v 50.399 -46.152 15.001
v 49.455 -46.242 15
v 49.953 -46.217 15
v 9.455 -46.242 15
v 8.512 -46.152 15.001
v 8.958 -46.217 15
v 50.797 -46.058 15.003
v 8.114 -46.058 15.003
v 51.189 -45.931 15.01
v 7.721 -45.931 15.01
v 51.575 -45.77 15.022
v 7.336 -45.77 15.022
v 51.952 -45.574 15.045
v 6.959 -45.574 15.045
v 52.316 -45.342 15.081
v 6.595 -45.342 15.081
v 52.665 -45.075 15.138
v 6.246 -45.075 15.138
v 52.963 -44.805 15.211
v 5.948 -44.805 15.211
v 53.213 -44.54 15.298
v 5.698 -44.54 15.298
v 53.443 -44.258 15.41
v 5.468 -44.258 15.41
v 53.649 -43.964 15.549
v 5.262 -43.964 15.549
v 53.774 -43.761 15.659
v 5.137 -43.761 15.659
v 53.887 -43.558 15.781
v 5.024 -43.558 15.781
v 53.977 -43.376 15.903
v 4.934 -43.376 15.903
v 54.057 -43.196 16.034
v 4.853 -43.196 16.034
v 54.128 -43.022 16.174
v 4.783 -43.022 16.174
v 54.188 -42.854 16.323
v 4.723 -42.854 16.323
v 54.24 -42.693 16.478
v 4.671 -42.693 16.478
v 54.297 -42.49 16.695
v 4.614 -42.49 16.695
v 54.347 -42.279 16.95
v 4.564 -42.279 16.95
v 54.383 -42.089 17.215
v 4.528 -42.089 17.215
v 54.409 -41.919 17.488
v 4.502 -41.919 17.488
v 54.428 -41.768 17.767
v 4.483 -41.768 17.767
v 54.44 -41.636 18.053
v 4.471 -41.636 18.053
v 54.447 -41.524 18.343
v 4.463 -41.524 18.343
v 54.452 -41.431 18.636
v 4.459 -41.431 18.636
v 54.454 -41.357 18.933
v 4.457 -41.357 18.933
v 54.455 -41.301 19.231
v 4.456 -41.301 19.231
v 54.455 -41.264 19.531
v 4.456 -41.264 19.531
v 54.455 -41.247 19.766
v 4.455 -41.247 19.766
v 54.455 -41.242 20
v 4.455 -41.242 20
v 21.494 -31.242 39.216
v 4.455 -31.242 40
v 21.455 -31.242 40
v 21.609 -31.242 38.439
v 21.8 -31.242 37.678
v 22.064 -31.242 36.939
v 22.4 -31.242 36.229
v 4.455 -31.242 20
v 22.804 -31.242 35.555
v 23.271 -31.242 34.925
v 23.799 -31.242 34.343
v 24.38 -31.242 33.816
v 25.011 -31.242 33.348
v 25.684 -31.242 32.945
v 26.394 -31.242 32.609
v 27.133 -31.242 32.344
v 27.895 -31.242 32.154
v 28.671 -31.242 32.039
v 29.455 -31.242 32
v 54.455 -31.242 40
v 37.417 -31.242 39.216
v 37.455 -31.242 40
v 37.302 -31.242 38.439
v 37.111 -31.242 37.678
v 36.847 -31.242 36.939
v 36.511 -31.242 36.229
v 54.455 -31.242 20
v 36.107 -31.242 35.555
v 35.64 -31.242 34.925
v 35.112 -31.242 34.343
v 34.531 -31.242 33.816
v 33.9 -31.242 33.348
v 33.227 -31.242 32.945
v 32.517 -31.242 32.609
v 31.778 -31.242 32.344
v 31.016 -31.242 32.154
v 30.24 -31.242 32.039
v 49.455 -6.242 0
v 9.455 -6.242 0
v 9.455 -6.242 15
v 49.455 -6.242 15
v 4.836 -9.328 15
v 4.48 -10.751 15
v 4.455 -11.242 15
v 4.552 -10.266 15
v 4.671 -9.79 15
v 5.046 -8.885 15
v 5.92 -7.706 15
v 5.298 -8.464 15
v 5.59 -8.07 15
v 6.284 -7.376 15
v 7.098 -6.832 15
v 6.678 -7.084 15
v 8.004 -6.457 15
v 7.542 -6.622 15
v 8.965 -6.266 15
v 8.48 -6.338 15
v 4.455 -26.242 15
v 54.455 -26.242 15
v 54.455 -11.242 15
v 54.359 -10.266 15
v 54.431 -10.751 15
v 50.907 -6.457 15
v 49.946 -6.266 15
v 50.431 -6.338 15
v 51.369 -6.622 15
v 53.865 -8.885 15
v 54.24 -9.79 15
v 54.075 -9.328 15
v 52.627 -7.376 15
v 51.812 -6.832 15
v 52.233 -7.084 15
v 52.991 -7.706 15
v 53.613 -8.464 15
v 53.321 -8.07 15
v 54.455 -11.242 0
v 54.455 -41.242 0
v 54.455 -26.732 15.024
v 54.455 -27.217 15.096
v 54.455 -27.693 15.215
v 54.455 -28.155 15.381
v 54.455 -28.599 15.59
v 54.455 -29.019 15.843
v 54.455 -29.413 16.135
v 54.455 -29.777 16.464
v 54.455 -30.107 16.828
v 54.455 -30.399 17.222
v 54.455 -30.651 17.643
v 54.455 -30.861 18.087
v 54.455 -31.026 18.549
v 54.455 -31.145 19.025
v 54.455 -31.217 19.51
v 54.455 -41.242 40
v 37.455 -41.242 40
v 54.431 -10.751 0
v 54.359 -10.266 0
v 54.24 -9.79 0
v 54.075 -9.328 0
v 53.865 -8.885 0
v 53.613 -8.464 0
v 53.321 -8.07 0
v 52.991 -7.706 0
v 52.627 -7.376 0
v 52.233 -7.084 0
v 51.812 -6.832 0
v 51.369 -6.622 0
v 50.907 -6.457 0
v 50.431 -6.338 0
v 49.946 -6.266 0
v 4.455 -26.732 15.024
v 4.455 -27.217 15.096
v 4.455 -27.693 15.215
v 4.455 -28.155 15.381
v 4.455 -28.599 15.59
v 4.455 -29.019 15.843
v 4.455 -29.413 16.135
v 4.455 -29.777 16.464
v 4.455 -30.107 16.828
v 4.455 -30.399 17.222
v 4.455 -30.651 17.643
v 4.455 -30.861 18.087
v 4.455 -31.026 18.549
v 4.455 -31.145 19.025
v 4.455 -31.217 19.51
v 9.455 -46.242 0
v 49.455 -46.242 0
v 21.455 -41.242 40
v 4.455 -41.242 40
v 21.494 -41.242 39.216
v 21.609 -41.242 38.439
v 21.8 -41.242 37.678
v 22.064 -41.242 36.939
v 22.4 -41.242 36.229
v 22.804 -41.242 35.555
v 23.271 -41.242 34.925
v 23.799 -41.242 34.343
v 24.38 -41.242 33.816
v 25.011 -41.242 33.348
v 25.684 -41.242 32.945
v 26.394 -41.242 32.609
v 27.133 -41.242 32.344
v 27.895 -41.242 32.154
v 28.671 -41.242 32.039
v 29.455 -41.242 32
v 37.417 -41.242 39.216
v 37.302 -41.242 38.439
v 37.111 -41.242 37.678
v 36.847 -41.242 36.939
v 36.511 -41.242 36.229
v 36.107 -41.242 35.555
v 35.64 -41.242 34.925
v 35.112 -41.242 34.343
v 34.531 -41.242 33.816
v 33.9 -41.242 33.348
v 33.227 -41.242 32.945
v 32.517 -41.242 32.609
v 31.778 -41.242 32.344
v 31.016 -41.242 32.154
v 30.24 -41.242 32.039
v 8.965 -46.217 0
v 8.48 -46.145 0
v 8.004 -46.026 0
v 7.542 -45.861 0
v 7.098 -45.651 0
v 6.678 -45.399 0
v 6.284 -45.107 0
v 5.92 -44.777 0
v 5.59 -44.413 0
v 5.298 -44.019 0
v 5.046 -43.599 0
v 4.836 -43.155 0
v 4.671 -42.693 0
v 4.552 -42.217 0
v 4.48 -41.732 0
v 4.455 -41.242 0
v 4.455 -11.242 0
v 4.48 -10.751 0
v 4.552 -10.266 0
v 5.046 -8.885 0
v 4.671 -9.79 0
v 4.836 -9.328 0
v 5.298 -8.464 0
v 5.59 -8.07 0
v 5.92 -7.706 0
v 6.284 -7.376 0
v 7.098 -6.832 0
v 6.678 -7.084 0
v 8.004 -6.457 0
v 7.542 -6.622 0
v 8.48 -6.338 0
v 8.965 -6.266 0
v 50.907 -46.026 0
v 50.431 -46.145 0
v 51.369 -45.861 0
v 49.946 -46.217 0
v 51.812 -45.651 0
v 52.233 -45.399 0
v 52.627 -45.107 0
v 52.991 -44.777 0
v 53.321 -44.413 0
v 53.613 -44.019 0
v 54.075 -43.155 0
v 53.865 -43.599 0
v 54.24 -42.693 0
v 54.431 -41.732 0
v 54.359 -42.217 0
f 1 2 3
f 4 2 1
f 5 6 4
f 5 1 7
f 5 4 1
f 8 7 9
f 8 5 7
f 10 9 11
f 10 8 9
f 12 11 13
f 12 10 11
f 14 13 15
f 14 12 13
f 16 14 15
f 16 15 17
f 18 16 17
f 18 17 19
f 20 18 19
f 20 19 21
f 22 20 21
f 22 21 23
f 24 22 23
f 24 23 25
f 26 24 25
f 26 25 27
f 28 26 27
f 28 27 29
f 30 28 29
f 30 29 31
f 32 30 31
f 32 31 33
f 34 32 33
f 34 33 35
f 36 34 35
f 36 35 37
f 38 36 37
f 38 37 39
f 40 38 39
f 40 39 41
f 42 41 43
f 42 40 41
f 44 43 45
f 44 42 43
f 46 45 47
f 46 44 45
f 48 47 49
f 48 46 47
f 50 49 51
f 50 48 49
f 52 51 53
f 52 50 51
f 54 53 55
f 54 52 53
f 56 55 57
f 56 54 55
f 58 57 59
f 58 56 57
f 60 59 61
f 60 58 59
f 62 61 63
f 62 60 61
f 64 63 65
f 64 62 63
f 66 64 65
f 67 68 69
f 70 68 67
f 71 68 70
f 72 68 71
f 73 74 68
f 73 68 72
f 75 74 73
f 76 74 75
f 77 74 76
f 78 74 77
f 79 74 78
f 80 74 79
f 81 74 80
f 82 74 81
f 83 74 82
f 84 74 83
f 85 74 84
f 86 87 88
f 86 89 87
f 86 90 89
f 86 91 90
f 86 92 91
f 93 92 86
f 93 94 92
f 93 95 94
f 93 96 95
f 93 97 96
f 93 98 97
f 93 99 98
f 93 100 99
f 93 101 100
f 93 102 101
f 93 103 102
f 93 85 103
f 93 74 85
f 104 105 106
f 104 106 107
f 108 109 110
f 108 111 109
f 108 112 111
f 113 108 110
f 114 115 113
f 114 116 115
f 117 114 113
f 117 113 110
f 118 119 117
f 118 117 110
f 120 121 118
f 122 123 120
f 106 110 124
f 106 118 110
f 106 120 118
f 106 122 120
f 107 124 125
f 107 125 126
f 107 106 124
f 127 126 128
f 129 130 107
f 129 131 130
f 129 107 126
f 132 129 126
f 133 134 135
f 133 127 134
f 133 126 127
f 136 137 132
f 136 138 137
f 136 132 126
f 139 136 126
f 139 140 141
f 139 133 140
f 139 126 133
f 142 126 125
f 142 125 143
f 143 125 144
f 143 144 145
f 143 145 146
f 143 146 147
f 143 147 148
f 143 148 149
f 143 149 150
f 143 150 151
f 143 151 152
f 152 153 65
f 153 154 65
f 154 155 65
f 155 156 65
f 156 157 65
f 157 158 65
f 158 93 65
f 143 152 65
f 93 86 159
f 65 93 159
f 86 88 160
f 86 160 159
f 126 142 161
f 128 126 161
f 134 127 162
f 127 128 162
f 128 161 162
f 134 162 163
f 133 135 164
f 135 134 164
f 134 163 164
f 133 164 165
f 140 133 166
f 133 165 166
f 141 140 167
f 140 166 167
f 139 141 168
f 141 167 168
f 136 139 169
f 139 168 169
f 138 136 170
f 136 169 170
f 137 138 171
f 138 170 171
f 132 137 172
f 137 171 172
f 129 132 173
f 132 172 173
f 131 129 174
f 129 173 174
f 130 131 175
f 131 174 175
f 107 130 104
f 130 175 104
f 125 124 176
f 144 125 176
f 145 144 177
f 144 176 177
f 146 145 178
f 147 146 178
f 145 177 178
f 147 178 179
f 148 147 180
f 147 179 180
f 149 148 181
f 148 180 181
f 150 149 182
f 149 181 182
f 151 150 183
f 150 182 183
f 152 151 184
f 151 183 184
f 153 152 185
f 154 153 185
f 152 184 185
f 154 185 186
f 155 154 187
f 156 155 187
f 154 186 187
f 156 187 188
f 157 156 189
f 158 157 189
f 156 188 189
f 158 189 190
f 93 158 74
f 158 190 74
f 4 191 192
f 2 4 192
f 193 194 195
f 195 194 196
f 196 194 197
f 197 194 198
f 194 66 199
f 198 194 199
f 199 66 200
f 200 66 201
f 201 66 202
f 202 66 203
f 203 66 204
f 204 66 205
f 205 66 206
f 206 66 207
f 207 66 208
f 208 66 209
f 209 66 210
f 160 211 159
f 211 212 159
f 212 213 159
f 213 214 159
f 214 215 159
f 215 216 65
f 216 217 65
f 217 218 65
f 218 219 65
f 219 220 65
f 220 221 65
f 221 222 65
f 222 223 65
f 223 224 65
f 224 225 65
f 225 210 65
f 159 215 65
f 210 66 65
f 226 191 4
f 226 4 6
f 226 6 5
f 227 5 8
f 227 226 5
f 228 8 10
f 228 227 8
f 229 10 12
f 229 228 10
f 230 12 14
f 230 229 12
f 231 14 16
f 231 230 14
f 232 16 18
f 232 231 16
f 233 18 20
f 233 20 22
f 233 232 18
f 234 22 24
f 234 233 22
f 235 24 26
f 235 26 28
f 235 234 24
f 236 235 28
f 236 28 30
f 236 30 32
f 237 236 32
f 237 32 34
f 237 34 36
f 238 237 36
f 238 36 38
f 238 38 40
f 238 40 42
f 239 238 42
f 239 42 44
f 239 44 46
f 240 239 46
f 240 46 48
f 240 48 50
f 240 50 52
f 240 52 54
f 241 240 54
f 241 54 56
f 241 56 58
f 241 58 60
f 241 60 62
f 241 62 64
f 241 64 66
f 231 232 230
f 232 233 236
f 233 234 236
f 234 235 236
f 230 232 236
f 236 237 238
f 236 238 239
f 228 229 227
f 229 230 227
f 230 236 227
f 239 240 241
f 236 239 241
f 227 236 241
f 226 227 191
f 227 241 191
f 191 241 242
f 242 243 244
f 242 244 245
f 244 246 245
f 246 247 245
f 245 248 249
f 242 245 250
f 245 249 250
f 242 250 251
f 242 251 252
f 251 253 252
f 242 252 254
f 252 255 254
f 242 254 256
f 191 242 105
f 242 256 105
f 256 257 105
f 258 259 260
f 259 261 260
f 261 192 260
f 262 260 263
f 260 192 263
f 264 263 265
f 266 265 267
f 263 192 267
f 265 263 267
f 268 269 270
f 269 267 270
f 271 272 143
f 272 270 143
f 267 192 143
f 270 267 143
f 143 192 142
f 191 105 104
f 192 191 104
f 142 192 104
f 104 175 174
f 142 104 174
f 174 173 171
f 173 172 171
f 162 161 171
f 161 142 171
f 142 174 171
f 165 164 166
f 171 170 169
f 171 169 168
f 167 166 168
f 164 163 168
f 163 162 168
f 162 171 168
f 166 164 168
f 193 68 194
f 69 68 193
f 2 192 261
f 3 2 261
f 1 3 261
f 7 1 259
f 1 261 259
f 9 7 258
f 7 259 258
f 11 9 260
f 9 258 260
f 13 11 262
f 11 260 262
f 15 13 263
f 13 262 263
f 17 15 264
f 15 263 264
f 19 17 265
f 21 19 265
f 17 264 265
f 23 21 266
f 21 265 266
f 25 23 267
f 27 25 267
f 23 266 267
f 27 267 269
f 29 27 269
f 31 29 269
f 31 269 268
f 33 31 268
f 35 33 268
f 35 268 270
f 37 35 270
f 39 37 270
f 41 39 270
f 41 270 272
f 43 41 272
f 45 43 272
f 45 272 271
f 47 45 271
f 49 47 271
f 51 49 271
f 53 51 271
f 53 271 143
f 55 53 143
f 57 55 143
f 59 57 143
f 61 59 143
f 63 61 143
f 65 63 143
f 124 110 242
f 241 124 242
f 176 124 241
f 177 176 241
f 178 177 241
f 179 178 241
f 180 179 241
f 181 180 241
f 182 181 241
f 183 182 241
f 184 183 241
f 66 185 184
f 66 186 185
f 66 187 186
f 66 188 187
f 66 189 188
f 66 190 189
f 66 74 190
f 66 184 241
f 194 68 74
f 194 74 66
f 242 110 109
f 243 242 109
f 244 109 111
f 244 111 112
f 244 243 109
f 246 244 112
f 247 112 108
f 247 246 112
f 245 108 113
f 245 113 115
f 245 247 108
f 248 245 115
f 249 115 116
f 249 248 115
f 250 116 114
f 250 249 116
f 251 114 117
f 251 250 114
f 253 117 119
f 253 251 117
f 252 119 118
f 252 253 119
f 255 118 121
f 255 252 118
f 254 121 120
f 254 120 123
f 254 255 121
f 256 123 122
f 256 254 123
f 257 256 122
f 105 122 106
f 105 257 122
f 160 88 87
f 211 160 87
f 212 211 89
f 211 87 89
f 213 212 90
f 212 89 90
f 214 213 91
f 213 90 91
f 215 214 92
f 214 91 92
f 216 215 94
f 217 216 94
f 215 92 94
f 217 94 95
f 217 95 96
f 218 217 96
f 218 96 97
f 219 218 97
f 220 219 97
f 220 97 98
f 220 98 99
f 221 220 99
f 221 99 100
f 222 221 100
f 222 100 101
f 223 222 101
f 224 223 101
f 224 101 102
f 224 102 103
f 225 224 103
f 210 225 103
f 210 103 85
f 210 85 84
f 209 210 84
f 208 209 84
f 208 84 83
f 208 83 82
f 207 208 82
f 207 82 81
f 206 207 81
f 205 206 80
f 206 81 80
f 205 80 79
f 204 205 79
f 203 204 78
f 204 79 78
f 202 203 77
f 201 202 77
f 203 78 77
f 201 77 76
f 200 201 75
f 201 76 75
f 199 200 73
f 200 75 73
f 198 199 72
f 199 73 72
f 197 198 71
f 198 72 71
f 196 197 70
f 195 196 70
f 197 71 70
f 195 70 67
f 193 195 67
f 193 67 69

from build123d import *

# Parameters (mm, degrees)
F0_W        = 50
F0_H        = 40
F1_DEPTH    = 15
F2_W        = 50
F2_H        = 10
F3_DEPTH    = 25
F5_DEPTH    = 25
F7_T1_DEPTH = 50
F7_T3_DEPTH = 40


# Not quite as in the source:
# - a fillet or chamfer that OpenCascade refuses, or shapes differently, is made with other operations: its cross-section is extruded or revolved along the edge and cut away or added
# - a feature of the source that left no trace in its solid (it failed there, or was rolled back) is left out


with BuildPart() as f1:
    # F0 (on Top) → F1 (new body)
    with BuildSketch(Plane.XY):
        with Locations((29.4554777443, -26.2415218353)):
            Rectangle(F0_W, F0_H)
    extrude(amount=F1_DEPTH)

    # F2 (on face) → F3 (join)
    with BuildSketch(Plane.XY.offset(15)):
        with Locations((29.4554777443, -36.2415218353)):
            Rectangle(F2_W, F2_H)
    extrude(amount=F3_DEPTH)

    # F4 (on face) → F5 (cut)
    with BuildSketch(Plane(origin=(0, -31.2415218353, 0), x_dir=(-1, 0, 0), z_dir=(0, 1, 0))):
        with BuildLine():
            ThreePointArc((-37.4554777443, 40), (-29.4554777443, 32), (-21.4554777443, 40))
            Line((-21.4554777443, 40), (-37.4554777443, 40))
        make_face()
    extrude(amount=-F5_DEPTH, mode=Mode.SUBTRACT)

    # F7: fillet of radius 5 on 6 edges, made by hand

    # F7_s2 → F7_t1 (join)
    with BuildSketch(Plane.YZ.offset(4.4554777443)):
        with BuildLine():
            ThreePointArc((-46.2415218353, 15), (-42.7059879294, 16.4644660941), (-41.2415218353, 20))
            Line((-41.2415218353, 20), (-41.2415218353, 15))
            Line((-41.2415218353, 15), (-46.2415218353, 15))
        make_face()
        with BuildLine():
            ThreePointArc((-26.2415218353, 15), (-29.7770557413, 16.4644660941), (-31.2415218353, 20))
            Line((-31.2415218353, 20), (-31.2415218353, 15))
            Line((-31.2415218353, 15), (-26.2415218353, 15))
        make_face()
    extrude(amount=F7_T1_DEPTH)

    # F7_s4 → F7_t3 (cut)
    with BuildSketch(Plane.XY.offset(-12.5)):
        with BuildLine():
            ThreePointArc((9.4554777443, -46.2415218353), (5.9199438384, -44.7770557413), (4.4554777443, -41.2415218353))
            Line((4.4554777443, -41.2415218353), (4.4554777443, -46.2415218353))
            Line((4.4554777443, -46.2415218353), (9.4554777443, -46.2415218353))
        make_face()
        with BuildLine():
            ThreePointArc((49.4554777443, -46.2415218353), (52.9910116503, -44.7770557413), (54.4554777443, -41.2415218353))
            Line((54.4554777443, -41.2415218353), (54.4554777443, -46.2415218353))
            Line((54.4554777443, -46.2415218353), (49.4554777443, -46.2415218353))
        make_face()
        with BuildLine():
            ThreePointArc((4.4554777443, -11.2415218353), (5.9199438384, -7.7059879294), (9.4554777443, -6.2415218353))
            Line((9.4554777443, -6.2415218353), (4.4554777443, -6.2415218353))
            Line((4.4554777443, -6.2415218353), (4.4554777443, -11.2415218353))
        make_face()
        with BuildLine():
            ThreePointArc((54.4554777443, -11.2415218353), (52.9910116503, -7.7059879294), (49.4554777443, -6.2415218353))
            Line((49.4554777443, -6.2415218353), (54.4554777443, -6.2415218353))
            Line((54.4554777443, -6.2415218353), (54.4554777443, -11.2415218353))
        make_face()
    extrude(amount=F7_T3_DEPTH, mode=Mode.SUBTRACT)


solid = f1.part
